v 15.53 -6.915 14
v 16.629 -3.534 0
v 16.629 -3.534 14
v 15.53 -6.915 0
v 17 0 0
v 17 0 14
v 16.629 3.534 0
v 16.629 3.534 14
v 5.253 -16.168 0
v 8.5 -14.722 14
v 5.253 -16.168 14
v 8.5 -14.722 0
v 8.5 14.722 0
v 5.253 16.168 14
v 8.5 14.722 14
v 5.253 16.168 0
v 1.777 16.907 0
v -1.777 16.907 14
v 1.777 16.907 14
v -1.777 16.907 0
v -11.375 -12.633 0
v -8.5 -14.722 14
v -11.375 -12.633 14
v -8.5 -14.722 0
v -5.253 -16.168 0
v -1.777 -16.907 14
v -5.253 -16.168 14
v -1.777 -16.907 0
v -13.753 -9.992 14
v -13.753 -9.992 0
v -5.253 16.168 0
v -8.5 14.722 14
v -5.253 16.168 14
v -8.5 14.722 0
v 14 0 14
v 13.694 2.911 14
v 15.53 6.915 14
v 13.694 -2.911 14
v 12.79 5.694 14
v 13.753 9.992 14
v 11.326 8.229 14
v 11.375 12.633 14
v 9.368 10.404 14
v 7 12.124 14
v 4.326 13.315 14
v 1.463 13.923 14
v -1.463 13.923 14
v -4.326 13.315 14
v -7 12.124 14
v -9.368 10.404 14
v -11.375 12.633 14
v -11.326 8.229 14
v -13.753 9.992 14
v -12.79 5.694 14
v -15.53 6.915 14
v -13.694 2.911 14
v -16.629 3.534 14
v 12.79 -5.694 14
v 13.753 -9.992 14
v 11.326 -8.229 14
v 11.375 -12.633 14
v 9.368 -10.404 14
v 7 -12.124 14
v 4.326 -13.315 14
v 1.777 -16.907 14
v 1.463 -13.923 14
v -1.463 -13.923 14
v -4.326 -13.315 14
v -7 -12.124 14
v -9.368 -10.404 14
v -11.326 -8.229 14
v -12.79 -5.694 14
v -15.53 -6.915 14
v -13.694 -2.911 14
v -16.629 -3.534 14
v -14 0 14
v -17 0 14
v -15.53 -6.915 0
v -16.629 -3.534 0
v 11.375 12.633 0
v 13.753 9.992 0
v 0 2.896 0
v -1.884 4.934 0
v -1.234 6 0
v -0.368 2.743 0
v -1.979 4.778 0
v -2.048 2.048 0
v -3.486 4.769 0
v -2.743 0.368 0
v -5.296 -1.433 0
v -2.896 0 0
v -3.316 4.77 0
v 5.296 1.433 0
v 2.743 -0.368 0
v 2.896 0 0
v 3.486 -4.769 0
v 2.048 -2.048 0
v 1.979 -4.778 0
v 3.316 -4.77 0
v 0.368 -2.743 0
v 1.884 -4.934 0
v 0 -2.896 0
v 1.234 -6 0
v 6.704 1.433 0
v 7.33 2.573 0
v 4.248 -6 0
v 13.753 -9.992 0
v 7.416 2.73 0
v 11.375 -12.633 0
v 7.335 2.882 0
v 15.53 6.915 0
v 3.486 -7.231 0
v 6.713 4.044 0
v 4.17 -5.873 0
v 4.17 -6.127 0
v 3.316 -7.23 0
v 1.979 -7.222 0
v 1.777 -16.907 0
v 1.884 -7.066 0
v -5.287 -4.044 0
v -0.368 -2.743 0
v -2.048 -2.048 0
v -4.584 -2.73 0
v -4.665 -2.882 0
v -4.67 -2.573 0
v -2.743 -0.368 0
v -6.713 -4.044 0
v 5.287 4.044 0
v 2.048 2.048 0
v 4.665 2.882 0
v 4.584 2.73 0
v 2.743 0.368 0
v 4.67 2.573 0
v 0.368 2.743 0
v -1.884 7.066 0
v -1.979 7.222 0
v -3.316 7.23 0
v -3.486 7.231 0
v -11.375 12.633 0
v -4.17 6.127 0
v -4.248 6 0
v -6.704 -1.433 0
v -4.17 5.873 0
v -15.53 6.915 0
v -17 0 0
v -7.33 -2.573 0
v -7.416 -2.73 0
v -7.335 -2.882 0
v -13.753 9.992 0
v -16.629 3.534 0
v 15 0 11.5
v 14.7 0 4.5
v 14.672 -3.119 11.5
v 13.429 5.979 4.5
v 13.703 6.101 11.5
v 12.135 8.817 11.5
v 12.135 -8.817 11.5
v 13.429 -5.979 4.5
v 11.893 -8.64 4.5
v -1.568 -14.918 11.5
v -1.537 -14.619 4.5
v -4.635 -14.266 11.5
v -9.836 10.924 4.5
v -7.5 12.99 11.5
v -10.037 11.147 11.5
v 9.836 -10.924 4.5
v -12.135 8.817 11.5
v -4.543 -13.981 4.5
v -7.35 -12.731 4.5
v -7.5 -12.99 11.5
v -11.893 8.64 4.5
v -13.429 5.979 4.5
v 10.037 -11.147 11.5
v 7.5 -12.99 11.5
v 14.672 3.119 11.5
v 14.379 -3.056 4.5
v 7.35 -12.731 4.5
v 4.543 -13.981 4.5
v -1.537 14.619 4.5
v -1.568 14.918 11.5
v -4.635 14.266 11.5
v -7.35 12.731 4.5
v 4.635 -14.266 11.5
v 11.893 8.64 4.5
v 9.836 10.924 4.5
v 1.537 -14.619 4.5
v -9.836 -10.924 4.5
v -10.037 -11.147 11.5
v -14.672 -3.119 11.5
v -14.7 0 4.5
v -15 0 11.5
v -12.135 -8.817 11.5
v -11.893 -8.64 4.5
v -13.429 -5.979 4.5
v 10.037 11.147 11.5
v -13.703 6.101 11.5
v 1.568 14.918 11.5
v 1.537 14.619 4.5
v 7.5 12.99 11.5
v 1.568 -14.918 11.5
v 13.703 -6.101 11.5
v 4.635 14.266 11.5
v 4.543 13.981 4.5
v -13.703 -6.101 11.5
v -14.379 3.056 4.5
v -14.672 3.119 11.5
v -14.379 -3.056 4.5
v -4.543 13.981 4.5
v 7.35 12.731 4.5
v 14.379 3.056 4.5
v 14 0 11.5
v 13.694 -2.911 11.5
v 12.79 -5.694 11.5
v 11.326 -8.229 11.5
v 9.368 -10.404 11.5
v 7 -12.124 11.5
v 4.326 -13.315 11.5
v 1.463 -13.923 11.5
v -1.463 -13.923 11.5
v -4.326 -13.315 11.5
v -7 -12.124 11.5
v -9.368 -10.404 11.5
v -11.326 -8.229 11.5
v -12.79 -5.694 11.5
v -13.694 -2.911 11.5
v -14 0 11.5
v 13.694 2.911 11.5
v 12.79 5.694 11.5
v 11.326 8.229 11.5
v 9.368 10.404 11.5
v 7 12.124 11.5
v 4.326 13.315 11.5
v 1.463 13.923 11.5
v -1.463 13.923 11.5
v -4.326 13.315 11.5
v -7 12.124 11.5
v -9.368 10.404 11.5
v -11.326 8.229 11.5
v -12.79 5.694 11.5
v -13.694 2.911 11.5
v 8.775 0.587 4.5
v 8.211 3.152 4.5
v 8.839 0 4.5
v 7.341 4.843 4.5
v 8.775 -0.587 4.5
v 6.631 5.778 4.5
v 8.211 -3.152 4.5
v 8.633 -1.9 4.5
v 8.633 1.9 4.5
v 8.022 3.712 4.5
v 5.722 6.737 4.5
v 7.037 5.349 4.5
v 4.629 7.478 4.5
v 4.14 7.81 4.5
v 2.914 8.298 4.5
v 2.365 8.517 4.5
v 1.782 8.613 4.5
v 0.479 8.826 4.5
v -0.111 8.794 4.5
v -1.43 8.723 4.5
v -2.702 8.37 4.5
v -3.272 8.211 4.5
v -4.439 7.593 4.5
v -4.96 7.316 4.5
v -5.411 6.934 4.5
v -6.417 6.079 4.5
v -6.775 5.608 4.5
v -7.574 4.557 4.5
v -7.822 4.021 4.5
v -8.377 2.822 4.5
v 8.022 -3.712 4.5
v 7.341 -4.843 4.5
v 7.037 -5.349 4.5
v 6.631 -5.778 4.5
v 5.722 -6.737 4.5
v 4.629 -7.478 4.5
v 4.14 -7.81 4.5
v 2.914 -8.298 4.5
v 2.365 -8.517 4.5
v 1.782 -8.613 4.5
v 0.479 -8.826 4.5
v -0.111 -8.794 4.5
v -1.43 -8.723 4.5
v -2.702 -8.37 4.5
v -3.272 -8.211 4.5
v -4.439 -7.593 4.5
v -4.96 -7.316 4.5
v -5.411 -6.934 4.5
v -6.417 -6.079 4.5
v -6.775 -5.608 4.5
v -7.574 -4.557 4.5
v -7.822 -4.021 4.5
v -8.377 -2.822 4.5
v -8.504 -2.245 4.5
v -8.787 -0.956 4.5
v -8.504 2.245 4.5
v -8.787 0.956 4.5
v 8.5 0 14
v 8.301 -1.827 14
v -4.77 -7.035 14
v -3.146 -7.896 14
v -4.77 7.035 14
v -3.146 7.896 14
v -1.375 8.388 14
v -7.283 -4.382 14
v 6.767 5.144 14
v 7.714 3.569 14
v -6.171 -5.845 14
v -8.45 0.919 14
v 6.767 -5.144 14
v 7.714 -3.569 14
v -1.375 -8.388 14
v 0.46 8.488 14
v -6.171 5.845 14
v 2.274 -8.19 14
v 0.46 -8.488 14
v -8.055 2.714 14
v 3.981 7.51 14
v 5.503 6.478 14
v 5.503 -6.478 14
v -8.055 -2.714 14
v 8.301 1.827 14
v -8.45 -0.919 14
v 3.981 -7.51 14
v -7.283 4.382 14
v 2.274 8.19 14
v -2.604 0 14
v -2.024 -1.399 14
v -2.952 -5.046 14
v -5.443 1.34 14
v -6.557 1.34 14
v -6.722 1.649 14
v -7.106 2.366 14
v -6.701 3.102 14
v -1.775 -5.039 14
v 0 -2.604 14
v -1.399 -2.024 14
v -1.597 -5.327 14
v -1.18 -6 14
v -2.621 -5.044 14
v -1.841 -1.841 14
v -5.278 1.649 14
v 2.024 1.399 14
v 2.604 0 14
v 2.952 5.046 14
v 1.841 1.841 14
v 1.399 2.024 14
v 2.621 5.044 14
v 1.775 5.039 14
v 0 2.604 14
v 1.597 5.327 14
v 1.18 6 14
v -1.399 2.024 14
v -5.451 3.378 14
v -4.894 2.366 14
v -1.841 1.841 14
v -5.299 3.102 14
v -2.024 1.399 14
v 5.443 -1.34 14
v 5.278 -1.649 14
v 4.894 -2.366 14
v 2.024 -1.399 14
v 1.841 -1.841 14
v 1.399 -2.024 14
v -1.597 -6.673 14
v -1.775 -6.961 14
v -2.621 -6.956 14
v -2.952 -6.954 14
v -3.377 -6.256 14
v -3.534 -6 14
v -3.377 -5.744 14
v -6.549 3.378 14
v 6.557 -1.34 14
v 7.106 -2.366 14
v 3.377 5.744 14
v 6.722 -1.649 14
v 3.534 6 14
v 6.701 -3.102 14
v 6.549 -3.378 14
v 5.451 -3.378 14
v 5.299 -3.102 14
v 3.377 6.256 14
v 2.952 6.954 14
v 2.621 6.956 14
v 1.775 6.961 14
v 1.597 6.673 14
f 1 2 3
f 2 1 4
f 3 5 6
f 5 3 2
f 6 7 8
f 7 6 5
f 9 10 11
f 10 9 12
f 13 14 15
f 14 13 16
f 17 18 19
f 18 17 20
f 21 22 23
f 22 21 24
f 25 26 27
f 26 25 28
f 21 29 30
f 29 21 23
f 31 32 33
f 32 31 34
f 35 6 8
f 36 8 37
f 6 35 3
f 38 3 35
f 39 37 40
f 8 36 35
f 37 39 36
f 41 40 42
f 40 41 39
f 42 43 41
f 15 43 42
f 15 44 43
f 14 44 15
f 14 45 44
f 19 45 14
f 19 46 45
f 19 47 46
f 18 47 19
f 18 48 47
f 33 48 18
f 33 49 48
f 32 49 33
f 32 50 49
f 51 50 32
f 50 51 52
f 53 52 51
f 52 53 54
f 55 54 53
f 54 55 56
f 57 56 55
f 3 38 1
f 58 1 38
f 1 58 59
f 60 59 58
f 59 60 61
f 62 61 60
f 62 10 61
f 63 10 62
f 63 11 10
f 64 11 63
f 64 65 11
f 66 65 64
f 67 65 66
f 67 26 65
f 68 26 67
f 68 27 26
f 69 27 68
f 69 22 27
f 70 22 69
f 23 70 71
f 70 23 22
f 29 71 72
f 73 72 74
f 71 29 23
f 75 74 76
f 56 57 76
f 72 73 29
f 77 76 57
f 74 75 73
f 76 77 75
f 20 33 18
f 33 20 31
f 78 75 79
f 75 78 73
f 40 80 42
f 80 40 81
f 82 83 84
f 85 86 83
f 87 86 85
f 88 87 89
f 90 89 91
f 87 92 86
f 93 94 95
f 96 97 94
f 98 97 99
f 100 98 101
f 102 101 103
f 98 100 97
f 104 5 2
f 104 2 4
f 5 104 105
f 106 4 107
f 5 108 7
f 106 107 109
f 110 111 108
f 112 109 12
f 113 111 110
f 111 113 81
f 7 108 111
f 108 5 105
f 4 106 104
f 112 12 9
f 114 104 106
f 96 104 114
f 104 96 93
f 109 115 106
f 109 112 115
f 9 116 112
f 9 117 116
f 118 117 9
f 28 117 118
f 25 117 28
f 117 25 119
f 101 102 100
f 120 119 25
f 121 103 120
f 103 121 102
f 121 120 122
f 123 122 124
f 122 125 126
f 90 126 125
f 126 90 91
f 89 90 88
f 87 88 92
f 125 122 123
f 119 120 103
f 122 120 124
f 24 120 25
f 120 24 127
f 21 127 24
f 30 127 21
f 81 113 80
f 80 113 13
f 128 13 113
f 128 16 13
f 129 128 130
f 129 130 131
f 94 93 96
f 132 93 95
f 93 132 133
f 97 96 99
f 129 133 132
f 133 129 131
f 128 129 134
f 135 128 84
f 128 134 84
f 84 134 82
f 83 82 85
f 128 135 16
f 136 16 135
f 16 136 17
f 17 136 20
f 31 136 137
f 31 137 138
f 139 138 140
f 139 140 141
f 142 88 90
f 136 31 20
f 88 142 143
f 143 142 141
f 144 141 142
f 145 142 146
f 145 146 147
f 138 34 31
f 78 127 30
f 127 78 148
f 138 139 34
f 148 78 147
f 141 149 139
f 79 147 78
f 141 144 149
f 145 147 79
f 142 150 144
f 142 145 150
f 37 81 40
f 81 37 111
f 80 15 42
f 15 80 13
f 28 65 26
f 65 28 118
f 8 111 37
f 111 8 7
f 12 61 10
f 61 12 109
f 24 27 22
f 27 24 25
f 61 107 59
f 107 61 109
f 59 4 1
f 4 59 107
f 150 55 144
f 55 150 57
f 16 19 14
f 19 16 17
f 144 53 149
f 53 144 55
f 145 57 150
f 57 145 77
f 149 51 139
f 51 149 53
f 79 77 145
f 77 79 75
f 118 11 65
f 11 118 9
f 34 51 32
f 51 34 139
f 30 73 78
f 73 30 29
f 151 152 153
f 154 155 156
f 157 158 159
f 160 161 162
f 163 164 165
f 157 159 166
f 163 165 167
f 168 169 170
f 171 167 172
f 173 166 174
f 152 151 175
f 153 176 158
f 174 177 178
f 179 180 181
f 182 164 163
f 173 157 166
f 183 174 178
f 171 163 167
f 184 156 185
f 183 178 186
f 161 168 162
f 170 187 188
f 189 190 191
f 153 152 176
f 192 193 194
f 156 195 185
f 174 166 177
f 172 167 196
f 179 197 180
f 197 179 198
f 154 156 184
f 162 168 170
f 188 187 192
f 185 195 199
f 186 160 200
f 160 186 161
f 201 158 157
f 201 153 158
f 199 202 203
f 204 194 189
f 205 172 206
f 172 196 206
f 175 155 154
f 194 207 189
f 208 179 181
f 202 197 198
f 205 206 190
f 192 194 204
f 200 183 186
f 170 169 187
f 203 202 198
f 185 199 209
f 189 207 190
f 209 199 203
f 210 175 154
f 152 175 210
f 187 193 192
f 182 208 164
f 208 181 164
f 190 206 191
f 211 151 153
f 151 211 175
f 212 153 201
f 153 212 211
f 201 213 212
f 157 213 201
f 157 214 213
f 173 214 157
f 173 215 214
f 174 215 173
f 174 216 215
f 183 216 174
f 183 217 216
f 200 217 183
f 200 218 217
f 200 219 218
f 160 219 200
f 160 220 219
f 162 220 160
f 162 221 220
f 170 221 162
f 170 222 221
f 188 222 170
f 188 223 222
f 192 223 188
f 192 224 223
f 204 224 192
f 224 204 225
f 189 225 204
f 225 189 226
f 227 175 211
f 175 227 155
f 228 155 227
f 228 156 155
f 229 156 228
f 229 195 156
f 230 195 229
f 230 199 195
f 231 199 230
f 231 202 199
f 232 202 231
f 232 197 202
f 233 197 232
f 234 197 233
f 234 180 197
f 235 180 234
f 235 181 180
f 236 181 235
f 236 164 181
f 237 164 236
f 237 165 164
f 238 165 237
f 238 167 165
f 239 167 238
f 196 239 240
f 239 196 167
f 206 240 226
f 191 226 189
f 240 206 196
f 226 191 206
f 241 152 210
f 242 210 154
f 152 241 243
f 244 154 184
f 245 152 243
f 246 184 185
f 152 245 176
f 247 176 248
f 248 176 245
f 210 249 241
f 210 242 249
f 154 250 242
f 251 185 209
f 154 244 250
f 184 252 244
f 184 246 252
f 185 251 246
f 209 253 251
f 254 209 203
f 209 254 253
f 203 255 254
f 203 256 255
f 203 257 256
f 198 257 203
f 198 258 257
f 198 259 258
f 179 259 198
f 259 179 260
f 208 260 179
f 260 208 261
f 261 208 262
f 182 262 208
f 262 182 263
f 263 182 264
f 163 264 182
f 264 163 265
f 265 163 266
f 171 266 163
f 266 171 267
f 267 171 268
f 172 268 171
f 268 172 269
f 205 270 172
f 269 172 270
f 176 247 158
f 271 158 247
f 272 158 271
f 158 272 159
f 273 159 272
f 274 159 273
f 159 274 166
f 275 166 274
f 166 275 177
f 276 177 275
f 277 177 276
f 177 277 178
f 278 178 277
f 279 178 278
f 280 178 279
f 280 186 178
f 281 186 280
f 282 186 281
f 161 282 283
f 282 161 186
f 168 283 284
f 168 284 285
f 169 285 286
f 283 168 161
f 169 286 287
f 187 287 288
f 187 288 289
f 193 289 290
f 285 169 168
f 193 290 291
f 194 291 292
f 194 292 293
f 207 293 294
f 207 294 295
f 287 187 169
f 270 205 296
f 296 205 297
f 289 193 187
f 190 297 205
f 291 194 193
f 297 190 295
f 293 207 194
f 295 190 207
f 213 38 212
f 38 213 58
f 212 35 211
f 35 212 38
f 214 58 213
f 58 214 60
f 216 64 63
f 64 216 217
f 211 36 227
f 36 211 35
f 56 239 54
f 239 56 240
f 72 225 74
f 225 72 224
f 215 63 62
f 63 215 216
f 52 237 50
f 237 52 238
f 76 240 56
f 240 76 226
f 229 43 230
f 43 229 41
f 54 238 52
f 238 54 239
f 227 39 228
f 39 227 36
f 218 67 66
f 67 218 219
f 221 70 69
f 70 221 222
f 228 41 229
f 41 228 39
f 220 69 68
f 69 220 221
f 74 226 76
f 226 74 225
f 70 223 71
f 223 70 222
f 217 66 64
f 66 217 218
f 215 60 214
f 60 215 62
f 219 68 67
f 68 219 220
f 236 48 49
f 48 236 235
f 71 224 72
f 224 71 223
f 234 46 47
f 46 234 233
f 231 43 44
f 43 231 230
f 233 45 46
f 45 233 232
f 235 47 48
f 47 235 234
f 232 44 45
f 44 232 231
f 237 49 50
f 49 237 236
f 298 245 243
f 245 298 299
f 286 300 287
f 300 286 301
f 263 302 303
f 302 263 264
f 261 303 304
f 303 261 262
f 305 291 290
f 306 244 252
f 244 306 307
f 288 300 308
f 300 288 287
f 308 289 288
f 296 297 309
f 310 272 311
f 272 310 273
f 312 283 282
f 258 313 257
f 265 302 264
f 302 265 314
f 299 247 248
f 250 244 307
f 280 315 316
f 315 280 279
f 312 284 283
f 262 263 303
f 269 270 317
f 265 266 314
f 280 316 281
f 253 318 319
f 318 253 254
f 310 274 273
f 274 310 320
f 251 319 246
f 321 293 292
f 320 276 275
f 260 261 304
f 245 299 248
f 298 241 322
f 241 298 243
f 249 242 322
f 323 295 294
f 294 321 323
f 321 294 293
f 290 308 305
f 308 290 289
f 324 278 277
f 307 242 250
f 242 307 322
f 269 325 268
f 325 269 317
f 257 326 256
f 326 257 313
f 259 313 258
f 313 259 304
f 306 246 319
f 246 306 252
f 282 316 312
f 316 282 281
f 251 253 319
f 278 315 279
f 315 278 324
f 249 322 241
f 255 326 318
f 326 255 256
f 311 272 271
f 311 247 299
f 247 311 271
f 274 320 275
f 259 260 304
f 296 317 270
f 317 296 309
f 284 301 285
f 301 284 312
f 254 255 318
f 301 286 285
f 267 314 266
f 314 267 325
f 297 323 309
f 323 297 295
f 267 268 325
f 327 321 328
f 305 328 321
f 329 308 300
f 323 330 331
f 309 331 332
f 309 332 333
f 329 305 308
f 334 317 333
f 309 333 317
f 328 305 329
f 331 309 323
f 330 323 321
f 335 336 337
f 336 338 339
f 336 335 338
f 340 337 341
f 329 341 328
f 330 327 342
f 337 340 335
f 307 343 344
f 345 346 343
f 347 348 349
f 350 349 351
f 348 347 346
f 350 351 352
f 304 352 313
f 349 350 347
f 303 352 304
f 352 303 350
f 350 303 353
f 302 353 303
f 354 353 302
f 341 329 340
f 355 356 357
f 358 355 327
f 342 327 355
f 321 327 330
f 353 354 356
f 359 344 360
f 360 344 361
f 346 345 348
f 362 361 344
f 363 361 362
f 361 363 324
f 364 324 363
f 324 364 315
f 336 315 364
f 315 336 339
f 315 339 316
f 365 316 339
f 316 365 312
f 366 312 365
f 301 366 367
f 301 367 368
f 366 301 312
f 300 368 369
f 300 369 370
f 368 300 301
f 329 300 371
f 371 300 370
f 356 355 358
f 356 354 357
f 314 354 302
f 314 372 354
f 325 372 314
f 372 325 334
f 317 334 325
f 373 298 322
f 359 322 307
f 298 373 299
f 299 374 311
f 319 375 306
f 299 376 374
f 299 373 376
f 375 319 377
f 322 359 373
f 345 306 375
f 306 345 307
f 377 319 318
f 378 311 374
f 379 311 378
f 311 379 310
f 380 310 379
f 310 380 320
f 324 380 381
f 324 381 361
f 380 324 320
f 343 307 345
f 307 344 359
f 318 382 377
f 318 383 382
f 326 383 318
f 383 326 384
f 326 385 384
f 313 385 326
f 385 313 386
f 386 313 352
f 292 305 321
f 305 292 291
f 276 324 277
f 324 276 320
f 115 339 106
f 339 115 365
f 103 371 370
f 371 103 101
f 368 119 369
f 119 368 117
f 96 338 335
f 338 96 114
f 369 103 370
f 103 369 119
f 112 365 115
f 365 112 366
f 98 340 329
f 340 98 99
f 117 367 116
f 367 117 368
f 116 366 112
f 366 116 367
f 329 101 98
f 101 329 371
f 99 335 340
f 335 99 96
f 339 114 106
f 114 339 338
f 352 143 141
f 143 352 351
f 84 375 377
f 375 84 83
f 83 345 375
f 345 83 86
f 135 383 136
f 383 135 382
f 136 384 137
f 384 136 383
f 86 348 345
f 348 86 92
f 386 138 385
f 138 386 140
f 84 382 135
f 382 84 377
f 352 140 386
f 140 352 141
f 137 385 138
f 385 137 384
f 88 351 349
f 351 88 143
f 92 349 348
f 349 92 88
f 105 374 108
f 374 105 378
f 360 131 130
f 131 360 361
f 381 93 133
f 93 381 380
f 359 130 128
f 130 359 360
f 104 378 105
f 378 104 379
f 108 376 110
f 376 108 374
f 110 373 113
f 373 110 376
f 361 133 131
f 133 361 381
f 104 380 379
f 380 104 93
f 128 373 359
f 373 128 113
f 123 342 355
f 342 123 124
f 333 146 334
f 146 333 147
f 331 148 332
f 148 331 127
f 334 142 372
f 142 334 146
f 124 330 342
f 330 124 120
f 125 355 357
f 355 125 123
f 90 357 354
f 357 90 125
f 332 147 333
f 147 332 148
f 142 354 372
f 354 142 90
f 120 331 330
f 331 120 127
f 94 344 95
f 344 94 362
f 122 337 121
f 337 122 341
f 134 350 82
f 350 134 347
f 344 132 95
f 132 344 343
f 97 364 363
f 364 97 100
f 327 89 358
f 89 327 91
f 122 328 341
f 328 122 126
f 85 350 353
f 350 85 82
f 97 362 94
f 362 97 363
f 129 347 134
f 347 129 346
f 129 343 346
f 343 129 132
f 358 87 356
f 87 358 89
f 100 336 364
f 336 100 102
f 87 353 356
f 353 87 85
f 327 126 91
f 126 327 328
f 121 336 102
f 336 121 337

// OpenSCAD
up = 1;
down = 0;

function optimal_facets(rad) = max(6,2*round(round(3+2*rad)/2));

module stopper(outer, inner, thickness, angle, trad) {
  off = 6;
  difference() {
    union() {
      difference() {
        cylinder(r=outer,h=thickness,center=true); // CAP
        translate([0,0,-1])
         cylinder(r2=inner+2.2,r1=inner+2.5, h=thickness/2,center=true);
        translate([0,0,-5.5])
         cylinder(r2=inner+1.5,r1=inner+1.5, h=thickness/4,center=true);
      }
      cylinder(r2=inner-3.5,r1=inner-4,h=thickness,center=true); // Stopper
    }
    translate([0,off,-0.5])
        rotate([0,angle,0])
        cone(trad,0.5,down,thickness+10);
    translate([0,-off,-0.5])
        rotate([0,-angle,0])
         cone(trad,0.5,down,thickness+10);
    translate([off,0,-0.5])
        rotate([angle,0,0])
         cone(trad,0.5,down,thickness+10);
    translate([-off,0,-0.5])
        rotate([-angle,0,0])
         cone(trad,0.5,down,thickness+10);
     cone(2.5,0.5,down,thickness+10);

  } // Subtract tubes from cap+stopper
//
}

module cone(radius,delta,updown,len) {
   rad1 = radius;
   rad2 = radius + delta;
   facets = optimal_facets(radius);
   if (updown == 1)
	  cylinder(r1=rad2,r2=rad1,h=len,center=true,$fn=facets);
   else
     cylinder(r2=rad2,r1=rad1,h=len,center=true,$fn=facets);
}

translate([0,0,7])
  rotate([180,0,0])
    stopper(17,12.5,14,20,1.0);
